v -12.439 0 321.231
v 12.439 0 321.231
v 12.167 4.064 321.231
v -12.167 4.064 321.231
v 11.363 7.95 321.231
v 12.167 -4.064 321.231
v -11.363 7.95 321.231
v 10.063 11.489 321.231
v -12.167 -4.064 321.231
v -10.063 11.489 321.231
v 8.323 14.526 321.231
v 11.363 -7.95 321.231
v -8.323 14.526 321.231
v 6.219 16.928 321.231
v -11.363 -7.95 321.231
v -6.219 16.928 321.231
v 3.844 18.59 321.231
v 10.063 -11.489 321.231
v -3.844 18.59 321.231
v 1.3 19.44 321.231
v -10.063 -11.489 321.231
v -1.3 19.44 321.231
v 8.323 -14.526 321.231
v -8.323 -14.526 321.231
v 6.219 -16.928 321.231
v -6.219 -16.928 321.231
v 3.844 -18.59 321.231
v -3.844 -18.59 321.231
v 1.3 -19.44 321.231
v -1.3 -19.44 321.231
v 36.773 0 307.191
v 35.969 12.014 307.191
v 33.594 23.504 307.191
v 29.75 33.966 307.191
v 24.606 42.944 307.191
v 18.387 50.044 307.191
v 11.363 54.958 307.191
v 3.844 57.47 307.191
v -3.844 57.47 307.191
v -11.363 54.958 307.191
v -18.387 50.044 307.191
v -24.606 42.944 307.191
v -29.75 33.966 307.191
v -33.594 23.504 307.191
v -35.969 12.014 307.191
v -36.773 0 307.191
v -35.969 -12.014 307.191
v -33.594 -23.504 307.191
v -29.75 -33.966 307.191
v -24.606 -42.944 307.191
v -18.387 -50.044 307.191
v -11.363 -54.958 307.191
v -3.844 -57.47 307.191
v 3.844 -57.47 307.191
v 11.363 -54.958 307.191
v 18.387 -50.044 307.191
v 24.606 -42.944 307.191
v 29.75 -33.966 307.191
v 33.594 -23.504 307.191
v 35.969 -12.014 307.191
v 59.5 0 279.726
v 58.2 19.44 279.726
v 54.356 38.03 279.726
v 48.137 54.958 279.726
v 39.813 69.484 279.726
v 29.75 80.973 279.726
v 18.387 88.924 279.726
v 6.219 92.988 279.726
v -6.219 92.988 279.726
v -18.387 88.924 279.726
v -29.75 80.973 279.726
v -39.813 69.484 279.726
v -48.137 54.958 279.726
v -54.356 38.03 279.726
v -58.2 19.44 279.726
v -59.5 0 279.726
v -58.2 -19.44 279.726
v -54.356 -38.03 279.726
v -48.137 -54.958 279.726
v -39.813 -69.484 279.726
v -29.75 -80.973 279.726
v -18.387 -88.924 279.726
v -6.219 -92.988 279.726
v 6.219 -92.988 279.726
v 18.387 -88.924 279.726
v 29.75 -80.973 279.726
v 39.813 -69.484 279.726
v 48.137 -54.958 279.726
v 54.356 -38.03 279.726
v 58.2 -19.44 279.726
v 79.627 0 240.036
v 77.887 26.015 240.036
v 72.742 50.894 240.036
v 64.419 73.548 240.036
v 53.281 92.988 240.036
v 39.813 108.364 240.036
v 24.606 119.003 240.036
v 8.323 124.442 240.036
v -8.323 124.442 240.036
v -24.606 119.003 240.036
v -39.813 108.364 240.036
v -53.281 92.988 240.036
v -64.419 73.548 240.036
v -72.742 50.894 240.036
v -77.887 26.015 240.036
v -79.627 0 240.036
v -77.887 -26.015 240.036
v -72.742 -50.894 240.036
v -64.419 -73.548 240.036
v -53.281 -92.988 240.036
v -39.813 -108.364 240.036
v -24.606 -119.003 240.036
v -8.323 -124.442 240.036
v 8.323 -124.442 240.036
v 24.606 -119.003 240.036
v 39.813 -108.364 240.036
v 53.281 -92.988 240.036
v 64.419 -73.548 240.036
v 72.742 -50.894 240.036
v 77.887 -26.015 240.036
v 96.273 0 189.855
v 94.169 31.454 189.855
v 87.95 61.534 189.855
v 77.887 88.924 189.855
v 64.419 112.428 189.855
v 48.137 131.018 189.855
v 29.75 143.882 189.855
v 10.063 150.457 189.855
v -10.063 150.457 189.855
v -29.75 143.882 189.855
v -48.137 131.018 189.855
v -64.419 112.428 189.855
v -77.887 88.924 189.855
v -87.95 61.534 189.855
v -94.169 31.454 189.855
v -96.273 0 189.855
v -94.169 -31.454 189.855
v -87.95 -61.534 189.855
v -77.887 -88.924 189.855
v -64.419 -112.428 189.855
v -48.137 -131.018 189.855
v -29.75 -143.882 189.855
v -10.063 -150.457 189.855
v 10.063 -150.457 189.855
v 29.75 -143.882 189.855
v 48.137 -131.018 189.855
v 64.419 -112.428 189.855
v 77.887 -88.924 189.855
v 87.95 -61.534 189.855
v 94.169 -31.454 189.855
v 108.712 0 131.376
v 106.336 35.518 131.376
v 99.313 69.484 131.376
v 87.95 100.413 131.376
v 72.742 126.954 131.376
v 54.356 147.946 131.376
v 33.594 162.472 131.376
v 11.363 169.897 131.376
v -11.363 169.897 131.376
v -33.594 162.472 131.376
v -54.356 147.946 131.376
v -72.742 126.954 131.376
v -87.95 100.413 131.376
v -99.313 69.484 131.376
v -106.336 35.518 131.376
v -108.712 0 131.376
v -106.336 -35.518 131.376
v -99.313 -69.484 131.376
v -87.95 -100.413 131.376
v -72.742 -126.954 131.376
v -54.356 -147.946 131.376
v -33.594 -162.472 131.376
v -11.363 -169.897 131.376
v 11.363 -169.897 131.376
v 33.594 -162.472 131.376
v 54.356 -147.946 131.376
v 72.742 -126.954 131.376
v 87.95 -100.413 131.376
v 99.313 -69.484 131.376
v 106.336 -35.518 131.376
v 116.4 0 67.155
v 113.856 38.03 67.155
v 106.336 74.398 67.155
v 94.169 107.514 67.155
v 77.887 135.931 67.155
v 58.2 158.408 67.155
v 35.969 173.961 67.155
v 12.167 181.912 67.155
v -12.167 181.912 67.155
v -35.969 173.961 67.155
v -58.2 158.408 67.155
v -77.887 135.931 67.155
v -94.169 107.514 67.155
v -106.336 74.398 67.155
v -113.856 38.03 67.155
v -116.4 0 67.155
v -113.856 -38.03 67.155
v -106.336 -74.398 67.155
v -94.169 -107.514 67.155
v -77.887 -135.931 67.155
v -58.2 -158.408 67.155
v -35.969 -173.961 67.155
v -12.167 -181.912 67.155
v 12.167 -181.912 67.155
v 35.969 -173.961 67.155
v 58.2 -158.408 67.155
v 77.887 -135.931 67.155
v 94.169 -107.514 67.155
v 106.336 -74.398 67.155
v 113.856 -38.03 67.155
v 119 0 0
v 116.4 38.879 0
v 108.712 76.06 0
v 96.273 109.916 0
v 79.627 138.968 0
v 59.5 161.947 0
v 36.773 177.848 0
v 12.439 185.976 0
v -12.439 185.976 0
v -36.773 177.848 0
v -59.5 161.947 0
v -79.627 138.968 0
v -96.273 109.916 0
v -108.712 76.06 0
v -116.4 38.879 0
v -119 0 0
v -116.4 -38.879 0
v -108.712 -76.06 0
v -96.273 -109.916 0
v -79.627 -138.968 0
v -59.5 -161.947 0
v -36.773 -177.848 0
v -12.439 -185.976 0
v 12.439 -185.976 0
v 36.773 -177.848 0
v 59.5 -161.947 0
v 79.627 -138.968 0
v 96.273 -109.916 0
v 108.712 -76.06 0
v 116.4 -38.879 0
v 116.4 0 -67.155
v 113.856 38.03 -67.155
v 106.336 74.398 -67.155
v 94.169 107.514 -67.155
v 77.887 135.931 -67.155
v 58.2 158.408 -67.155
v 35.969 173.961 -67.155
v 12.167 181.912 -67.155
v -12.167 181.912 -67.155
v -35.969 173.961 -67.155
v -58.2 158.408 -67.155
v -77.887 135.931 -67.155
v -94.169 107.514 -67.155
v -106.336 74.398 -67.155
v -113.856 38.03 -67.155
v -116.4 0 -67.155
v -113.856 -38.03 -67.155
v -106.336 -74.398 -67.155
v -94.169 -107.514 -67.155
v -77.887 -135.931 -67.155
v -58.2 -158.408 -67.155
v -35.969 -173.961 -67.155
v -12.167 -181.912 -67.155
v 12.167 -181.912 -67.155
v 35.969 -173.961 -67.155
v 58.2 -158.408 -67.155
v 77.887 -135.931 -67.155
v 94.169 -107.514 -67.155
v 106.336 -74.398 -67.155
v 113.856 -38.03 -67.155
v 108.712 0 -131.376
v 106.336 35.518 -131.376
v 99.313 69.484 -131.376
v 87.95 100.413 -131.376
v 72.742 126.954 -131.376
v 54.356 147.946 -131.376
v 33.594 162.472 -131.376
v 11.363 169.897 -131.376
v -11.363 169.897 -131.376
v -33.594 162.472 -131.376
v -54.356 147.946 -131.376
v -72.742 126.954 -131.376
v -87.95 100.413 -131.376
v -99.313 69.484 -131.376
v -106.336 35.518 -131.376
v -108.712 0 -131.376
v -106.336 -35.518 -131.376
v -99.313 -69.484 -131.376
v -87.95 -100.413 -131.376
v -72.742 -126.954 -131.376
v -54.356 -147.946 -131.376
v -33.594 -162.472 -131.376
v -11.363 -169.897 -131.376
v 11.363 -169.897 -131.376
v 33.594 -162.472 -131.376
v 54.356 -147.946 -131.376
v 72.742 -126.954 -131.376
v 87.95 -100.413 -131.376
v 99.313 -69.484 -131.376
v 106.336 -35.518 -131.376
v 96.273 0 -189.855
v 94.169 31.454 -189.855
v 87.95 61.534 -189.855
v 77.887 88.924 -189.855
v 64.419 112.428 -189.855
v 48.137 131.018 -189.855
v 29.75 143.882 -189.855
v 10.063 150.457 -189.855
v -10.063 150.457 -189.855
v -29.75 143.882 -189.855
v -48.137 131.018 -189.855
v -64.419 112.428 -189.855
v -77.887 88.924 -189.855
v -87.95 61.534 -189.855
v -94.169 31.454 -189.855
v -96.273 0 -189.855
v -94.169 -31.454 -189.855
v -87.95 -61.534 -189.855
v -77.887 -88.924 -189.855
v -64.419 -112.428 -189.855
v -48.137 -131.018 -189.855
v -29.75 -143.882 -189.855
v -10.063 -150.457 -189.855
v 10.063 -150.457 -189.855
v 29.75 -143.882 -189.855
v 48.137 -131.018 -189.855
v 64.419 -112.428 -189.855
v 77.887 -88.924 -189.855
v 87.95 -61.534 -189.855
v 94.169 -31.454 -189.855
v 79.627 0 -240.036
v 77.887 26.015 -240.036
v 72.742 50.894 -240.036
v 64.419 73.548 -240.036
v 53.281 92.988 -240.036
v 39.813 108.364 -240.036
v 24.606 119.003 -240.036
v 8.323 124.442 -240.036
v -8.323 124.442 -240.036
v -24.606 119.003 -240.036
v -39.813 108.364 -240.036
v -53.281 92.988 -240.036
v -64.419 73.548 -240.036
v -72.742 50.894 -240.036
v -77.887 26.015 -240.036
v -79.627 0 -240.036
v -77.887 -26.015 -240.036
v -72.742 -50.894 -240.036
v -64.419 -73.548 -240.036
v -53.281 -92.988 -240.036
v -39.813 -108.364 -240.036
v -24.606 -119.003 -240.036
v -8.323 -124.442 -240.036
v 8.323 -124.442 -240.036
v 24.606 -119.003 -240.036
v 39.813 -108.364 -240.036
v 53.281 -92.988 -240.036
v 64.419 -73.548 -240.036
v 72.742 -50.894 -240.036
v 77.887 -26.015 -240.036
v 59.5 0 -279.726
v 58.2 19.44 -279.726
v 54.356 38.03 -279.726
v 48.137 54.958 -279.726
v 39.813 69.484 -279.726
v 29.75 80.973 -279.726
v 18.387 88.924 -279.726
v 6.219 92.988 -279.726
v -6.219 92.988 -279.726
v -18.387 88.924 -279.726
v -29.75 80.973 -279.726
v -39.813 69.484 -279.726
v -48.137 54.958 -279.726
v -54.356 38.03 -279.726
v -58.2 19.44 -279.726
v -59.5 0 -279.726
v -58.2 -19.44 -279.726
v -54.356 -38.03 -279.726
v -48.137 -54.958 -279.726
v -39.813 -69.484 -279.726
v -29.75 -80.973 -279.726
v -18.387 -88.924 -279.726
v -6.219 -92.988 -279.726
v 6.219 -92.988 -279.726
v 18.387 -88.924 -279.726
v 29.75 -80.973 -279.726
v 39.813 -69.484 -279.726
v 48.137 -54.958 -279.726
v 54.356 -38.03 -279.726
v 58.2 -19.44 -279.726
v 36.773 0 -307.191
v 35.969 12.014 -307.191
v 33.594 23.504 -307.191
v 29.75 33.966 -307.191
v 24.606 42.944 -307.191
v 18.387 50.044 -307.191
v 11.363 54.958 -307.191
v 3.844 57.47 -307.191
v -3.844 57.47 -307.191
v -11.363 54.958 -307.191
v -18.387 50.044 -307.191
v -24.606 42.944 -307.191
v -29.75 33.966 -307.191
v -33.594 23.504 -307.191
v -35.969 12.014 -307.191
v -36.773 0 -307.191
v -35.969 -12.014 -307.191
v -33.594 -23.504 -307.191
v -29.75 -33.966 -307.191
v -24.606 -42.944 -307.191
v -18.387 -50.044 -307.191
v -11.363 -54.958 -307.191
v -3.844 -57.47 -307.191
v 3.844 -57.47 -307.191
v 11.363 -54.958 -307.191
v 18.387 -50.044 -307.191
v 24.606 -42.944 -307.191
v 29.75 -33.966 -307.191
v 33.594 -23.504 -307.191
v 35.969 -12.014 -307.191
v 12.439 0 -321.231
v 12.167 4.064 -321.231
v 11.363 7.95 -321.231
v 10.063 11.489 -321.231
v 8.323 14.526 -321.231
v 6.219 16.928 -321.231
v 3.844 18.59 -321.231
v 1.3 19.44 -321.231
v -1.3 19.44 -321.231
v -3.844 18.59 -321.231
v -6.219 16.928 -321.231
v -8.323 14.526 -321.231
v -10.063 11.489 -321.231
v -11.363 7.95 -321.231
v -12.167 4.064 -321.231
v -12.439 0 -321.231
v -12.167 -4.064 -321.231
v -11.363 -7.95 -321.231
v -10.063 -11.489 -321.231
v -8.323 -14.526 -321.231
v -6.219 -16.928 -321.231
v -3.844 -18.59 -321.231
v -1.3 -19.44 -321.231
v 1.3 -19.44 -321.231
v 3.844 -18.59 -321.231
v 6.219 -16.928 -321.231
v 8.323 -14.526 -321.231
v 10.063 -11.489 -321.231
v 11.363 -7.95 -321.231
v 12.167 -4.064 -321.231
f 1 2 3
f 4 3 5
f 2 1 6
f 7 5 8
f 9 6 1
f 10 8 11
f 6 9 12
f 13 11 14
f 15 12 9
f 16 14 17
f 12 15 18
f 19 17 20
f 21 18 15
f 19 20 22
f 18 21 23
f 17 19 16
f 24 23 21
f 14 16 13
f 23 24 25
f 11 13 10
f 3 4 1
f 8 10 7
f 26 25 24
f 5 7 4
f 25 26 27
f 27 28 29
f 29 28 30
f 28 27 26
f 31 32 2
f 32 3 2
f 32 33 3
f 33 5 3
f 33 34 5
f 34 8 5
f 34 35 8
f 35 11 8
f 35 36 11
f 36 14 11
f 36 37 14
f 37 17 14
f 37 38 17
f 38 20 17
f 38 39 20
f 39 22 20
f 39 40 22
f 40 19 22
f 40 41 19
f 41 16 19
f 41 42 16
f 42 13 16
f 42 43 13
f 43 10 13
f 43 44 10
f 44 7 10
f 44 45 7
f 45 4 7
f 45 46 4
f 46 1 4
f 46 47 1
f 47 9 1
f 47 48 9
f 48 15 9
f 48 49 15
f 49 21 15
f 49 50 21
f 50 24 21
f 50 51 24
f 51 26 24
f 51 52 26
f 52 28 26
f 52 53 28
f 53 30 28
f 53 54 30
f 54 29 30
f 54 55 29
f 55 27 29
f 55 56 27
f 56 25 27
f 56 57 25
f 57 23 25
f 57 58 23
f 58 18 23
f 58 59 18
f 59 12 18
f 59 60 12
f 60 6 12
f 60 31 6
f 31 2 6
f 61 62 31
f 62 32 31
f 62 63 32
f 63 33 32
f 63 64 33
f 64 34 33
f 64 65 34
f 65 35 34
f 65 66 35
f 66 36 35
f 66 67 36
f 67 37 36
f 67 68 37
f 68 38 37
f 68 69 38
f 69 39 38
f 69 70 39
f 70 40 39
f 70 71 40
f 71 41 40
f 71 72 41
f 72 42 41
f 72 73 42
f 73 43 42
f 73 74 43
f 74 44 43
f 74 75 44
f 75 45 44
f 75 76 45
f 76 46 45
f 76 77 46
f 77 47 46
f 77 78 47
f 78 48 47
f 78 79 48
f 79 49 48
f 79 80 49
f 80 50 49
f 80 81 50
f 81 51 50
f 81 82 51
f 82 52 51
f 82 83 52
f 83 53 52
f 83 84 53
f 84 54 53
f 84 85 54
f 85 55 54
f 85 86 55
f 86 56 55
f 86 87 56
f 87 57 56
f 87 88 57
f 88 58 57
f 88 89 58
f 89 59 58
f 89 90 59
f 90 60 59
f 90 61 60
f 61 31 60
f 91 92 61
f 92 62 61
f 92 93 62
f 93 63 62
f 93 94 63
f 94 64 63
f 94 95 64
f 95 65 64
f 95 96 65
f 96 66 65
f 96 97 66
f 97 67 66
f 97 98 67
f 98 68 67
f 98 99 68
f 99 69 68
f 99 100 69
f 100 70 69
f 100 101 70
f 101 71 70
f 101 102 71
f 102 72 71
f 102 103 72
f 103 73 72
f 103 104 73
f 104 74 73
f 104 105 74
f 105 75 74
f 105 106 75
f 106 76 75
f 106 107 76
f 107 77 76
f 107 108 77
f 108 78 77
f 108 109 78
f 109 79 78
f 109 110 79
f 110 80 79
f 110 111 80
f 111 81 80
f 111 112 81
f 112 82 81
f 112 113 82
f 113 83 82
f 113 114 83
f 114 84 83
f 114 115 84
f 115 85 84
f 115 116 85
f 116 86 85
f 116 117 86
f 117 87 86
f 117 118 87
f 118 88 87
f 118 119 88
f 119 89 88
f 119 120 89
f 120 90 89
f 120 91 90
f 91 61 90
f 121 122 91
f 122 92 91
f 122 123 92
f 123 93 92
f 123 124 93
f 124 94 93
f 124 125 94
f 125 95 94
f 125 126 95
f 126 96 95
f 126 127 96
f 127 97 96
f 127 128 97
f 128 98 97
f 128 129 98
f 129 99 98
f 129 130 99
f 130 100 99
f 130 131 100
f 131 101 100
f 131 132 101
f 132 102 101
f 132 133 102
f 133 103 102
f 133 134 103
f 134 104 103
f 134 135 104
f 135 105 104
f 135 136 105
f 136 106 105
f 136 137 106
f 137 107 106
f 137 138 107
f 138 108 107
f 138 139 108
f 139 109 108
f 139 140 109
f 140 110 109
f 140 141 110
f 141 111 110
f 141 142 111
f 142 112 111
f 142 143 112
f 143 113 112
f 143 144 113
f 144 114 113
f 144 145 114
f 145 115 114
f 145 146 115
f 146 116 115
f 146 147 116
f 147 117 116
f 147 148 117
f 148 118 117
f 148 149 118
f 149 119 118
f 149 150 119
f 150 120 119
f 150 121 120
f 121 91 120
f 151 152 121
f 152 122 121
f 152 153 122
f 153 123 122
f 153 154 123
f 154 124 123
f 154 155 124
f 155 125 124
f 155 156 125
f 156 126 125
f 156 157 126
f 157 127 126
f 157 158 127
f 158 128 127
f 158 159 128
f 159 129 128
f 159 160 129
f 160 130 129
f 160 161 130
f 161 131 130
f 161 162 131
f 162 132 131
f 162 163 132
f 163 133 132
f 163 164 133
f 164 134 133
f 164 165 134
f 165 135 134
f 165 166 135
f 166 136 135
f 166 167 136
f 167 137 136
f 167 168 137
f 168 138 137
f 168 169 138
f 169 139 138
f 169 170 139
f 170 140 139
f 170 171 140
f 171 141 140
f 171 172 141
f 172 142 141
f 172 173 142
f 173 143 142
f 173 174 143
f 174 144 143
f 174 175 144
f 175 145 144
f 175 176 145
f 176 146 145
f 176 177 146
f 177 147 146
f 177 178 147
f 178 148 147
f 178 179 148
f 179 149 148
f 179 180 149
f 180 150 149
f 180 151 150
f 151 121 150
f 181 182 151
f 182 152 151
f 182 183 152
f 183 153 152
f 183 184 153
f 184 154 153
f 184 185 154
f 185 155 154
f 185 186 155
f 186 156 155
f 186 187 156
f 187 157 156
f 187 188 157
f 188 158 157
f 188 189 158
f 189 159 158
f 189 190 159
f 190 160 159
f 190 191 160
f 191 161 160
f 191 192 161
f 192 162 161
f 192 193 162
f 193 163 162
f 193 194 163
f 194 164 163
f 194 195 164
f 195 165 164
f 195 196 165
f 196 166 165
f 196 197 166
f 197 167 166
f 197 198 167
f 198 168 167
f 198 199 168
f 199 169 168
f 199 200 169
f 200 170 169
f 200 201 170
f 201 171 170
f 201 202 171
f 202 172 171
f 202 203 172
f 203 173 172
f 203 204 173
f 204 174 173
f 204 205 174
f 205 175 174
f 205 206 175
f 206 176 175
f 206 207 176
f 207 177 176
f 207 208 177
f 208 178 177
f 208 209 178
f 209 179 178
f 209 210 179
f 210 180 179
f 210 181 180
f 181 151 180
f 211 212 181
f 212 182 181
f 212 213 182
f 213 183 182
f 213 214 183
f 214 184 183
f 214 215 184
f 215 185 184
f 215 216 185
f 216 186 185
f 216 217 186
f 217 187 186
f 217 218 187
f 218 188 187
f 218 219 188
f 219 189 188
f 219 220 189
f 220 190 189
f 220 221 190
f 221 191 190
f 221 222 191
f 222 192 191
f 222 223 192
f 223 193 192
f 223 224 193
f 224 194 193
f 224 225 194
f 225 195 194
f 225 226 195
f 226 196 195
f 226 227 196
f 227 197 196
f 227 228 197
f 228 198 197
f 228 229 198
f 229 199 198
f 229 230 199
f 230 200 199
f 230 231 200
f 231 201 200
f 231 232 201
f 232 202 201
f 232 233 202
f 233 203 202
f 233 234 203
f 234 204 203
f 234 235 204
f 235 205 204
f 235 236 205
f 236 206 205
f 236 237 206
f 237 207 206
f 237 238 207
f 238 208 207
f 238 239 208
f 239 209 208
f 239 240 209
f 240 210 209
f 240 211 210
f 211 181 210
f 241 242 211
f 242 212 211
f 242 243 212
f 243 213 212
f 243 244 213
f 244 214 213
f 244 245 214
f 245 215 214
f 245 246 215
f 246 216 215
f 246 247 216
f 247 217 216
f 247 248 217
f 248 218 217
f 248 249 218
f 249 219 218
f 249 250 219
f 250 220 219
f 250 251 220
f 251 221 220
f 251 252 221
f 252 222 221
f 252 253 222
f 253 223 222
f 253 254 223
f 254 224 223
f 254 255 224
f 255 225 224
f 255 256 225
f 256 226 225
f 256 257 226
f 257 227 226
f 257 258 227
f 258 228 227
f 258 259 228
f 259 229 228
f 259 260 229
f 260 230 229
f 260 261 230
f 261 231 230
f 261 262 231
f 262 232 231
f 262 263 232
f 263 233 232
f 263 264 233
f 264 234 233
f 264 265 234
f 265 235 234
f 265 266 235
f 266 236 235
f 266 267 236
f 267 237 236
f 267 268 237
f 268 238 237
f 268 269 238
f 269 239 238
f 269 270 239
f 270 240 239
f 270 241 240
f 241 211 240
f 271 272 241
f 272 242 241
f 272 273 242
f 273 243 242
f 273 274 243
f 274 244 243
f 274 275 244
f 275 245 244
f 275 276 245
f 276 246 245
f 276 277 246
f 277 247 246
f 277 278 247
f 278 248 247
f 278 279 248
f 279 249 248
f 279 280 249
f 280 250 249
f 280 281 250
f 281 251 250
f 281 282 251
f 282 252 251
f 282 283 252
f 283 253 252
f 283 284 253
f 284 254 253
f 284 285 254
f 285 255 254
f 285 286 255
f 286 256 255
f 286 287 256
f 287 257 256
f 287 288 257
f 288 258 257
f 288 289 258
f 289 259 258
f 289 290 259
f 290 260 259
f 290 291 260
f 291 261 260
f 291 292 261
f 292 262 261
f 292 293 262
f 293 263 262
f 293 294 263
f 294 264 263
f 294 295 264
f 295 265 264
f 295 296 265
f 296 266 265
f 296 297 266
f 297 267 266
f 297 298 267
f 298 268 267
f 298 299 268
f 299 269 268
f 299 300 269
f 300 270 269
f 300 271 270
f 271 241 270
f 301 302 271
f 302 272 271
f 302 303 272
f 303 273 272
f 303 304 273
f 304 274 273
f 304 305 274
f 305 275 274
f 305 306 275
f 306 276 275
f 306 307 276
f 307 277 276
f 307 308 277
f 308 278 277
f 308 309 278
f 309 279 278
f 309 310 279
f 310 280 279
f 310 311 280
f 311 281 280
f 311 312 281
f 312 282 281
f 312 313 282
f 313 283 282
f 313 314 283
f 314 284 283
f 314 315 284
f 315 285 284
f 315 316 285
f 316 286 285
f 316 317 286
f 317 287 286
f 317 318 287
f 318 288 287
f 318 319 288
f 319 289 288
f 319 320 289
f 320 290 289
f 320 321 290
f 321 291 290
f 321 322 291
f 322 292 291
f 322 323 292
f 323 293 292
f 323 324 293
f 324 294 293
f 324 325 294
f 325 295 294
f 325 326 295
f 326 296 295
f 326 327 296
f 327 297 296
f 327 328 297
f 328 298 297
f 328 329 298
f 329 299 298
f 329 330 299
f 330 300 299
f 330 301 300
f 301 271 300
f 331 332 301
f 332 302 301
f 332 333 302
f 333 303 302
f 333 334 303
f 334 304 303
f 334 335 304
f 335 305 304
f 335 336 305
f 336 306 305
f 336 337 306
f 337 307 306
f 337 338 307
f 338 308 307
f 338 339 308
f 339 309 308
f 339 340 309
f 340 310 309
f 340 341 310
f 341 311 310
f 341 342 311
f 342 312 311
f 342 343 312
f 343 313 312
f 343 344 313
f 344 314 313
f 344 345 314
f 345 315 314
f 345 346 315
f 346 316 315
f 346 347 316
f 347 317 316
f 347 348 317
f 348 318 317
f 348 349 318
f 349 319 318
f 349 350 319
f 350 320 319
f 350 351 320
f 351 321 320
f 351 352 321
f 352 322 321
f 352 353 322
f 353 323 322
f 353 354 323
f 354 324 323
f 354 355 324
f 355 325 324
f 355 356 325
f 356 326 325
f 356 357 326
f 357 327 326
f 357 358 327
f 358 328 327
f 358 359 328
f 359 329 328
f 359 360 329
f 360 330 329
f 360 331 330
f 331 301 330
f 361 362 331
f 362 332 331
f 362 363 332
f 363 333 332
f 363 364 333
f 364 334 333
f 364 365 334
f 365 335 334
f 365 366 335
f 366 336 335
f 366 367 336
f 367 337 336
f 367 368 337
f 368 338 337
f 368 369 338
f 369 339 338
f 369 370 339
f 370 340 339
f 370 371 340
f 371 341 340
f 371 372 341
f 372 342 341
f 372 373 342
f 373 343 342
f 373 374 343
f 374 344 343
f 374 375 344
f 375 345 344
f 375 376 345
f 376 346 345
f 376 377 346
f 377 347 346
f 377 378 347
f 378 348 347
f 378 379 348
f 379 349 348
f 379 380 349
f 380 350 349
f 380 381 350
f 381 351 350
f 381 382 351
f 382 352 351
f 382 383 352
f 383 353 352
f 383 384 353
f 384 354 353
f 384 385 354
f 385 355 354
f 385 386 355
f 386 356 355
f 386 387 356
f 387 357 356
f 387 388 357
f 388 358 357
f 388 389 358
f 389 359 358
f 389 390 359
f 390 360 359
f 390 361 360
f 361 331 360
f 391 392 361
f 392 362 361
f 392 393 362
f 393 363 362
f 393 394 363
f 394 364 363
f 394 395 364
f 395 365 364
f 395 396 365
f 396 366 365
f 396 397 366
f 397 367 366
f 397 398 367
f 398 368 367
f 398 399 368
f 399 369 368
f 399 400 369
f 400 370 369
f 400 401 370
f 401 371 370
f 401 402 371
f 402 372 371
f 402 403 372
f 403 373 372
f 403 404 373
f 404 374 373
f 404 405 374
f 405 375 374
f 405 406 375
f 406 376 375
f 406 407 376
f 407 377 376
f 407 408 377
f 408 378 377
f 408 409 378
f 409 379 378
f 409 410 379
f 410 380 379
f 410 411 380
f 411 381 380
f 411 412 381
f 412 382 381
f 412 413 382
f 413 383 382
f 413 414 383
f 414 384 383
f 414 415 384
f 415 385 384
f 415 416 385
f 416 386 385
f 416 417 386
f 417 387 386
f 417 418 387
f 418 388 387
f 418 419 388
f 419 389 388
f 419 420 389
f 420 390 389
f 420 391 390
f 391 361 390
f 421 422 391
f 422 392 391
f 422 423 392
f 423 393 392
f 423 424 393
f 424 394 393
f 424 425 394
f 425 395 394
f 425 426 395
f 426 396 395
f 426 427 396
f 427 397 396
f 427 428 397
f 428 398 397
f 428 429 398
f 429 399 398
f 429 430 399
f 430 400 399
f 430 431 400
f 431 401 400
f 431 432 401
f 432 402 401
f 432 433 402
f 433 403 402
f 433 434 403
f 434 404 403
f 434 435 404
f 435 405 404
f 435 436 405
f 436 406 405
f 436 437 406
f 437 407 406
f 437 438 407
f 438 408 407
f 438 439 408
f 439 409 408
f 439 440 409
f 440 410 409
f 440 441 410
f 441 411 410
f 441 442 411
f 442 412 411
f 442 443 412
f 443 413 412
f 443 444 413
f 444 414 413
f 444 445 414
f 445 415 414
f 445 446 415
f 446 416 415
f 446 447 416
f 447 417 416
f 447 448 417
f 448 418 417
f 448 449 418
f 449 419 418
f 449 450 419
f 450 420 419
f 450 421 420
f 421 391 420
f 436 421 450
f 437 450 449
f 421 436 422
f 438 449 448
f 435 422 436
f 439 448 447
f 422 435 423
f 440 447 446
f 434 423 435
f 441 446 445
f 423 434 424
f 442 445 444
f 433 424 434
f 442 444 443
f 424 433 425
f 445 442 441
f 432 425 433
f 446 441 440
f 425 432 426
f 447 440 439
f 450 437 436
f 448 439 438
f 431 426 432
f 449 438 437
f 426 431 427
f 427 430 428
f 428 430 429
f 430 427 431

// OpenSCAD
// Generated by SolidPython 1.0.1 on 2020-07-29 00:46:47


scale(v = [7, 11, 19]) {
	sphere(r = 17);
}
/***********************************************
*********      SolidPython code:      **********
************************************************
 
# import packages: SolidPython
from solid import *
from solid.utils import *
from itertools import chain, combinations, permutations


class Resize:

    def __init__(self, scad_file):
        self.scad_file = scad_file
        #self.scad_file = import_scad(scad_file)
        # cone/cylinder param:
        self.r1 = 0
        self.r2 = 0
        self.h = 0
        # rectangular prism param:
        self.w = 0
        self.l = 0
        # ellipse param:
        self.r = 0

    # import OpenScad code (file name corresponds to shape)


    # classify shape + parameters
    def assign(self, param1, param2, param3):
        if self.scad_file == 'cone.scad':
            self.r1 = param1
            self.r2 = param2
            self.h = param3
        elif self.scad_file == 'cylinder.scad':
            self.r1 = param1
            self.r2 = param2
            self.h = param3
        elif self.scad_file == 'rectangularPrism.scad':
            self.h = param1
            self.l = param2
            self.w = param3
        else:
            self.r = param1
            self.h = param2

    # resize parameters
    def iterate(self):
        x = range(3, 20, 2)
        i = 1
        if self.scad_file == 'cone.scad':
            tempList = list(permutations(x, 2))
            for temp in tempList:
                param1 = temp[0]
                param2 = temp[1]
                filepath = 'produced_scad_files/' + 'cone' + str(param1) + '_' + str(param2) + '_' + '.scad'
                scad_render_to_file(cylinder(h=param1, r1=param2, r2=0), filepath)

        elif self.scad_file == 'cylinder.scad':
            tempList = list(permutations(x, 3))
            for temp in tempList:
                param1 = temp[0]
                param2 = temp[1]
                filepath = 'produced_scad_files/' + 'cylinder' + str(param1) + '_' + str(param2) + '_' + '.scad'
                scad_render_to_file(cylinder(h=param1, r1=param2, r2=param2), filepath)

        elif self.scad_file == 'rectangularPrism.scad':
            tempList = list(permutations(x, 3))
            for temp in tempList:
                param1 = temp[0]
                param2 = temp[1]
                param3 = temp[2]
                filepath = 'produced_scad_files/' + 'rectangularPrism' + str(param1) + '_' + str(param2) + '_' + str(
                    param3) + '.scad'
                scad_render_to_file(cube(size=(param1, param2, param3)), filepath)

        elif self.scad_file == 'ellipse.scad':
            tempList = list(permutations(x, 4))
            for temp in tempList:
                param1 = temp[0]
                param2 = temp[1]
                param3 = temp[2]
                param4 = temp[3]
                filepath = 'produced_scad_files/' + 'ellipse' + str(param1) + '_' + str(param2) + '_' + str(param3) + '_' + str(param4) + '.scad'
                scad_render_to_file(scale([param1, param2, param3])(sphere(r=param4)), filepath)

    def render_to_scadfile(self):
        scad_render_to_file(scad, 'example.scad') 
 
************************************************/
